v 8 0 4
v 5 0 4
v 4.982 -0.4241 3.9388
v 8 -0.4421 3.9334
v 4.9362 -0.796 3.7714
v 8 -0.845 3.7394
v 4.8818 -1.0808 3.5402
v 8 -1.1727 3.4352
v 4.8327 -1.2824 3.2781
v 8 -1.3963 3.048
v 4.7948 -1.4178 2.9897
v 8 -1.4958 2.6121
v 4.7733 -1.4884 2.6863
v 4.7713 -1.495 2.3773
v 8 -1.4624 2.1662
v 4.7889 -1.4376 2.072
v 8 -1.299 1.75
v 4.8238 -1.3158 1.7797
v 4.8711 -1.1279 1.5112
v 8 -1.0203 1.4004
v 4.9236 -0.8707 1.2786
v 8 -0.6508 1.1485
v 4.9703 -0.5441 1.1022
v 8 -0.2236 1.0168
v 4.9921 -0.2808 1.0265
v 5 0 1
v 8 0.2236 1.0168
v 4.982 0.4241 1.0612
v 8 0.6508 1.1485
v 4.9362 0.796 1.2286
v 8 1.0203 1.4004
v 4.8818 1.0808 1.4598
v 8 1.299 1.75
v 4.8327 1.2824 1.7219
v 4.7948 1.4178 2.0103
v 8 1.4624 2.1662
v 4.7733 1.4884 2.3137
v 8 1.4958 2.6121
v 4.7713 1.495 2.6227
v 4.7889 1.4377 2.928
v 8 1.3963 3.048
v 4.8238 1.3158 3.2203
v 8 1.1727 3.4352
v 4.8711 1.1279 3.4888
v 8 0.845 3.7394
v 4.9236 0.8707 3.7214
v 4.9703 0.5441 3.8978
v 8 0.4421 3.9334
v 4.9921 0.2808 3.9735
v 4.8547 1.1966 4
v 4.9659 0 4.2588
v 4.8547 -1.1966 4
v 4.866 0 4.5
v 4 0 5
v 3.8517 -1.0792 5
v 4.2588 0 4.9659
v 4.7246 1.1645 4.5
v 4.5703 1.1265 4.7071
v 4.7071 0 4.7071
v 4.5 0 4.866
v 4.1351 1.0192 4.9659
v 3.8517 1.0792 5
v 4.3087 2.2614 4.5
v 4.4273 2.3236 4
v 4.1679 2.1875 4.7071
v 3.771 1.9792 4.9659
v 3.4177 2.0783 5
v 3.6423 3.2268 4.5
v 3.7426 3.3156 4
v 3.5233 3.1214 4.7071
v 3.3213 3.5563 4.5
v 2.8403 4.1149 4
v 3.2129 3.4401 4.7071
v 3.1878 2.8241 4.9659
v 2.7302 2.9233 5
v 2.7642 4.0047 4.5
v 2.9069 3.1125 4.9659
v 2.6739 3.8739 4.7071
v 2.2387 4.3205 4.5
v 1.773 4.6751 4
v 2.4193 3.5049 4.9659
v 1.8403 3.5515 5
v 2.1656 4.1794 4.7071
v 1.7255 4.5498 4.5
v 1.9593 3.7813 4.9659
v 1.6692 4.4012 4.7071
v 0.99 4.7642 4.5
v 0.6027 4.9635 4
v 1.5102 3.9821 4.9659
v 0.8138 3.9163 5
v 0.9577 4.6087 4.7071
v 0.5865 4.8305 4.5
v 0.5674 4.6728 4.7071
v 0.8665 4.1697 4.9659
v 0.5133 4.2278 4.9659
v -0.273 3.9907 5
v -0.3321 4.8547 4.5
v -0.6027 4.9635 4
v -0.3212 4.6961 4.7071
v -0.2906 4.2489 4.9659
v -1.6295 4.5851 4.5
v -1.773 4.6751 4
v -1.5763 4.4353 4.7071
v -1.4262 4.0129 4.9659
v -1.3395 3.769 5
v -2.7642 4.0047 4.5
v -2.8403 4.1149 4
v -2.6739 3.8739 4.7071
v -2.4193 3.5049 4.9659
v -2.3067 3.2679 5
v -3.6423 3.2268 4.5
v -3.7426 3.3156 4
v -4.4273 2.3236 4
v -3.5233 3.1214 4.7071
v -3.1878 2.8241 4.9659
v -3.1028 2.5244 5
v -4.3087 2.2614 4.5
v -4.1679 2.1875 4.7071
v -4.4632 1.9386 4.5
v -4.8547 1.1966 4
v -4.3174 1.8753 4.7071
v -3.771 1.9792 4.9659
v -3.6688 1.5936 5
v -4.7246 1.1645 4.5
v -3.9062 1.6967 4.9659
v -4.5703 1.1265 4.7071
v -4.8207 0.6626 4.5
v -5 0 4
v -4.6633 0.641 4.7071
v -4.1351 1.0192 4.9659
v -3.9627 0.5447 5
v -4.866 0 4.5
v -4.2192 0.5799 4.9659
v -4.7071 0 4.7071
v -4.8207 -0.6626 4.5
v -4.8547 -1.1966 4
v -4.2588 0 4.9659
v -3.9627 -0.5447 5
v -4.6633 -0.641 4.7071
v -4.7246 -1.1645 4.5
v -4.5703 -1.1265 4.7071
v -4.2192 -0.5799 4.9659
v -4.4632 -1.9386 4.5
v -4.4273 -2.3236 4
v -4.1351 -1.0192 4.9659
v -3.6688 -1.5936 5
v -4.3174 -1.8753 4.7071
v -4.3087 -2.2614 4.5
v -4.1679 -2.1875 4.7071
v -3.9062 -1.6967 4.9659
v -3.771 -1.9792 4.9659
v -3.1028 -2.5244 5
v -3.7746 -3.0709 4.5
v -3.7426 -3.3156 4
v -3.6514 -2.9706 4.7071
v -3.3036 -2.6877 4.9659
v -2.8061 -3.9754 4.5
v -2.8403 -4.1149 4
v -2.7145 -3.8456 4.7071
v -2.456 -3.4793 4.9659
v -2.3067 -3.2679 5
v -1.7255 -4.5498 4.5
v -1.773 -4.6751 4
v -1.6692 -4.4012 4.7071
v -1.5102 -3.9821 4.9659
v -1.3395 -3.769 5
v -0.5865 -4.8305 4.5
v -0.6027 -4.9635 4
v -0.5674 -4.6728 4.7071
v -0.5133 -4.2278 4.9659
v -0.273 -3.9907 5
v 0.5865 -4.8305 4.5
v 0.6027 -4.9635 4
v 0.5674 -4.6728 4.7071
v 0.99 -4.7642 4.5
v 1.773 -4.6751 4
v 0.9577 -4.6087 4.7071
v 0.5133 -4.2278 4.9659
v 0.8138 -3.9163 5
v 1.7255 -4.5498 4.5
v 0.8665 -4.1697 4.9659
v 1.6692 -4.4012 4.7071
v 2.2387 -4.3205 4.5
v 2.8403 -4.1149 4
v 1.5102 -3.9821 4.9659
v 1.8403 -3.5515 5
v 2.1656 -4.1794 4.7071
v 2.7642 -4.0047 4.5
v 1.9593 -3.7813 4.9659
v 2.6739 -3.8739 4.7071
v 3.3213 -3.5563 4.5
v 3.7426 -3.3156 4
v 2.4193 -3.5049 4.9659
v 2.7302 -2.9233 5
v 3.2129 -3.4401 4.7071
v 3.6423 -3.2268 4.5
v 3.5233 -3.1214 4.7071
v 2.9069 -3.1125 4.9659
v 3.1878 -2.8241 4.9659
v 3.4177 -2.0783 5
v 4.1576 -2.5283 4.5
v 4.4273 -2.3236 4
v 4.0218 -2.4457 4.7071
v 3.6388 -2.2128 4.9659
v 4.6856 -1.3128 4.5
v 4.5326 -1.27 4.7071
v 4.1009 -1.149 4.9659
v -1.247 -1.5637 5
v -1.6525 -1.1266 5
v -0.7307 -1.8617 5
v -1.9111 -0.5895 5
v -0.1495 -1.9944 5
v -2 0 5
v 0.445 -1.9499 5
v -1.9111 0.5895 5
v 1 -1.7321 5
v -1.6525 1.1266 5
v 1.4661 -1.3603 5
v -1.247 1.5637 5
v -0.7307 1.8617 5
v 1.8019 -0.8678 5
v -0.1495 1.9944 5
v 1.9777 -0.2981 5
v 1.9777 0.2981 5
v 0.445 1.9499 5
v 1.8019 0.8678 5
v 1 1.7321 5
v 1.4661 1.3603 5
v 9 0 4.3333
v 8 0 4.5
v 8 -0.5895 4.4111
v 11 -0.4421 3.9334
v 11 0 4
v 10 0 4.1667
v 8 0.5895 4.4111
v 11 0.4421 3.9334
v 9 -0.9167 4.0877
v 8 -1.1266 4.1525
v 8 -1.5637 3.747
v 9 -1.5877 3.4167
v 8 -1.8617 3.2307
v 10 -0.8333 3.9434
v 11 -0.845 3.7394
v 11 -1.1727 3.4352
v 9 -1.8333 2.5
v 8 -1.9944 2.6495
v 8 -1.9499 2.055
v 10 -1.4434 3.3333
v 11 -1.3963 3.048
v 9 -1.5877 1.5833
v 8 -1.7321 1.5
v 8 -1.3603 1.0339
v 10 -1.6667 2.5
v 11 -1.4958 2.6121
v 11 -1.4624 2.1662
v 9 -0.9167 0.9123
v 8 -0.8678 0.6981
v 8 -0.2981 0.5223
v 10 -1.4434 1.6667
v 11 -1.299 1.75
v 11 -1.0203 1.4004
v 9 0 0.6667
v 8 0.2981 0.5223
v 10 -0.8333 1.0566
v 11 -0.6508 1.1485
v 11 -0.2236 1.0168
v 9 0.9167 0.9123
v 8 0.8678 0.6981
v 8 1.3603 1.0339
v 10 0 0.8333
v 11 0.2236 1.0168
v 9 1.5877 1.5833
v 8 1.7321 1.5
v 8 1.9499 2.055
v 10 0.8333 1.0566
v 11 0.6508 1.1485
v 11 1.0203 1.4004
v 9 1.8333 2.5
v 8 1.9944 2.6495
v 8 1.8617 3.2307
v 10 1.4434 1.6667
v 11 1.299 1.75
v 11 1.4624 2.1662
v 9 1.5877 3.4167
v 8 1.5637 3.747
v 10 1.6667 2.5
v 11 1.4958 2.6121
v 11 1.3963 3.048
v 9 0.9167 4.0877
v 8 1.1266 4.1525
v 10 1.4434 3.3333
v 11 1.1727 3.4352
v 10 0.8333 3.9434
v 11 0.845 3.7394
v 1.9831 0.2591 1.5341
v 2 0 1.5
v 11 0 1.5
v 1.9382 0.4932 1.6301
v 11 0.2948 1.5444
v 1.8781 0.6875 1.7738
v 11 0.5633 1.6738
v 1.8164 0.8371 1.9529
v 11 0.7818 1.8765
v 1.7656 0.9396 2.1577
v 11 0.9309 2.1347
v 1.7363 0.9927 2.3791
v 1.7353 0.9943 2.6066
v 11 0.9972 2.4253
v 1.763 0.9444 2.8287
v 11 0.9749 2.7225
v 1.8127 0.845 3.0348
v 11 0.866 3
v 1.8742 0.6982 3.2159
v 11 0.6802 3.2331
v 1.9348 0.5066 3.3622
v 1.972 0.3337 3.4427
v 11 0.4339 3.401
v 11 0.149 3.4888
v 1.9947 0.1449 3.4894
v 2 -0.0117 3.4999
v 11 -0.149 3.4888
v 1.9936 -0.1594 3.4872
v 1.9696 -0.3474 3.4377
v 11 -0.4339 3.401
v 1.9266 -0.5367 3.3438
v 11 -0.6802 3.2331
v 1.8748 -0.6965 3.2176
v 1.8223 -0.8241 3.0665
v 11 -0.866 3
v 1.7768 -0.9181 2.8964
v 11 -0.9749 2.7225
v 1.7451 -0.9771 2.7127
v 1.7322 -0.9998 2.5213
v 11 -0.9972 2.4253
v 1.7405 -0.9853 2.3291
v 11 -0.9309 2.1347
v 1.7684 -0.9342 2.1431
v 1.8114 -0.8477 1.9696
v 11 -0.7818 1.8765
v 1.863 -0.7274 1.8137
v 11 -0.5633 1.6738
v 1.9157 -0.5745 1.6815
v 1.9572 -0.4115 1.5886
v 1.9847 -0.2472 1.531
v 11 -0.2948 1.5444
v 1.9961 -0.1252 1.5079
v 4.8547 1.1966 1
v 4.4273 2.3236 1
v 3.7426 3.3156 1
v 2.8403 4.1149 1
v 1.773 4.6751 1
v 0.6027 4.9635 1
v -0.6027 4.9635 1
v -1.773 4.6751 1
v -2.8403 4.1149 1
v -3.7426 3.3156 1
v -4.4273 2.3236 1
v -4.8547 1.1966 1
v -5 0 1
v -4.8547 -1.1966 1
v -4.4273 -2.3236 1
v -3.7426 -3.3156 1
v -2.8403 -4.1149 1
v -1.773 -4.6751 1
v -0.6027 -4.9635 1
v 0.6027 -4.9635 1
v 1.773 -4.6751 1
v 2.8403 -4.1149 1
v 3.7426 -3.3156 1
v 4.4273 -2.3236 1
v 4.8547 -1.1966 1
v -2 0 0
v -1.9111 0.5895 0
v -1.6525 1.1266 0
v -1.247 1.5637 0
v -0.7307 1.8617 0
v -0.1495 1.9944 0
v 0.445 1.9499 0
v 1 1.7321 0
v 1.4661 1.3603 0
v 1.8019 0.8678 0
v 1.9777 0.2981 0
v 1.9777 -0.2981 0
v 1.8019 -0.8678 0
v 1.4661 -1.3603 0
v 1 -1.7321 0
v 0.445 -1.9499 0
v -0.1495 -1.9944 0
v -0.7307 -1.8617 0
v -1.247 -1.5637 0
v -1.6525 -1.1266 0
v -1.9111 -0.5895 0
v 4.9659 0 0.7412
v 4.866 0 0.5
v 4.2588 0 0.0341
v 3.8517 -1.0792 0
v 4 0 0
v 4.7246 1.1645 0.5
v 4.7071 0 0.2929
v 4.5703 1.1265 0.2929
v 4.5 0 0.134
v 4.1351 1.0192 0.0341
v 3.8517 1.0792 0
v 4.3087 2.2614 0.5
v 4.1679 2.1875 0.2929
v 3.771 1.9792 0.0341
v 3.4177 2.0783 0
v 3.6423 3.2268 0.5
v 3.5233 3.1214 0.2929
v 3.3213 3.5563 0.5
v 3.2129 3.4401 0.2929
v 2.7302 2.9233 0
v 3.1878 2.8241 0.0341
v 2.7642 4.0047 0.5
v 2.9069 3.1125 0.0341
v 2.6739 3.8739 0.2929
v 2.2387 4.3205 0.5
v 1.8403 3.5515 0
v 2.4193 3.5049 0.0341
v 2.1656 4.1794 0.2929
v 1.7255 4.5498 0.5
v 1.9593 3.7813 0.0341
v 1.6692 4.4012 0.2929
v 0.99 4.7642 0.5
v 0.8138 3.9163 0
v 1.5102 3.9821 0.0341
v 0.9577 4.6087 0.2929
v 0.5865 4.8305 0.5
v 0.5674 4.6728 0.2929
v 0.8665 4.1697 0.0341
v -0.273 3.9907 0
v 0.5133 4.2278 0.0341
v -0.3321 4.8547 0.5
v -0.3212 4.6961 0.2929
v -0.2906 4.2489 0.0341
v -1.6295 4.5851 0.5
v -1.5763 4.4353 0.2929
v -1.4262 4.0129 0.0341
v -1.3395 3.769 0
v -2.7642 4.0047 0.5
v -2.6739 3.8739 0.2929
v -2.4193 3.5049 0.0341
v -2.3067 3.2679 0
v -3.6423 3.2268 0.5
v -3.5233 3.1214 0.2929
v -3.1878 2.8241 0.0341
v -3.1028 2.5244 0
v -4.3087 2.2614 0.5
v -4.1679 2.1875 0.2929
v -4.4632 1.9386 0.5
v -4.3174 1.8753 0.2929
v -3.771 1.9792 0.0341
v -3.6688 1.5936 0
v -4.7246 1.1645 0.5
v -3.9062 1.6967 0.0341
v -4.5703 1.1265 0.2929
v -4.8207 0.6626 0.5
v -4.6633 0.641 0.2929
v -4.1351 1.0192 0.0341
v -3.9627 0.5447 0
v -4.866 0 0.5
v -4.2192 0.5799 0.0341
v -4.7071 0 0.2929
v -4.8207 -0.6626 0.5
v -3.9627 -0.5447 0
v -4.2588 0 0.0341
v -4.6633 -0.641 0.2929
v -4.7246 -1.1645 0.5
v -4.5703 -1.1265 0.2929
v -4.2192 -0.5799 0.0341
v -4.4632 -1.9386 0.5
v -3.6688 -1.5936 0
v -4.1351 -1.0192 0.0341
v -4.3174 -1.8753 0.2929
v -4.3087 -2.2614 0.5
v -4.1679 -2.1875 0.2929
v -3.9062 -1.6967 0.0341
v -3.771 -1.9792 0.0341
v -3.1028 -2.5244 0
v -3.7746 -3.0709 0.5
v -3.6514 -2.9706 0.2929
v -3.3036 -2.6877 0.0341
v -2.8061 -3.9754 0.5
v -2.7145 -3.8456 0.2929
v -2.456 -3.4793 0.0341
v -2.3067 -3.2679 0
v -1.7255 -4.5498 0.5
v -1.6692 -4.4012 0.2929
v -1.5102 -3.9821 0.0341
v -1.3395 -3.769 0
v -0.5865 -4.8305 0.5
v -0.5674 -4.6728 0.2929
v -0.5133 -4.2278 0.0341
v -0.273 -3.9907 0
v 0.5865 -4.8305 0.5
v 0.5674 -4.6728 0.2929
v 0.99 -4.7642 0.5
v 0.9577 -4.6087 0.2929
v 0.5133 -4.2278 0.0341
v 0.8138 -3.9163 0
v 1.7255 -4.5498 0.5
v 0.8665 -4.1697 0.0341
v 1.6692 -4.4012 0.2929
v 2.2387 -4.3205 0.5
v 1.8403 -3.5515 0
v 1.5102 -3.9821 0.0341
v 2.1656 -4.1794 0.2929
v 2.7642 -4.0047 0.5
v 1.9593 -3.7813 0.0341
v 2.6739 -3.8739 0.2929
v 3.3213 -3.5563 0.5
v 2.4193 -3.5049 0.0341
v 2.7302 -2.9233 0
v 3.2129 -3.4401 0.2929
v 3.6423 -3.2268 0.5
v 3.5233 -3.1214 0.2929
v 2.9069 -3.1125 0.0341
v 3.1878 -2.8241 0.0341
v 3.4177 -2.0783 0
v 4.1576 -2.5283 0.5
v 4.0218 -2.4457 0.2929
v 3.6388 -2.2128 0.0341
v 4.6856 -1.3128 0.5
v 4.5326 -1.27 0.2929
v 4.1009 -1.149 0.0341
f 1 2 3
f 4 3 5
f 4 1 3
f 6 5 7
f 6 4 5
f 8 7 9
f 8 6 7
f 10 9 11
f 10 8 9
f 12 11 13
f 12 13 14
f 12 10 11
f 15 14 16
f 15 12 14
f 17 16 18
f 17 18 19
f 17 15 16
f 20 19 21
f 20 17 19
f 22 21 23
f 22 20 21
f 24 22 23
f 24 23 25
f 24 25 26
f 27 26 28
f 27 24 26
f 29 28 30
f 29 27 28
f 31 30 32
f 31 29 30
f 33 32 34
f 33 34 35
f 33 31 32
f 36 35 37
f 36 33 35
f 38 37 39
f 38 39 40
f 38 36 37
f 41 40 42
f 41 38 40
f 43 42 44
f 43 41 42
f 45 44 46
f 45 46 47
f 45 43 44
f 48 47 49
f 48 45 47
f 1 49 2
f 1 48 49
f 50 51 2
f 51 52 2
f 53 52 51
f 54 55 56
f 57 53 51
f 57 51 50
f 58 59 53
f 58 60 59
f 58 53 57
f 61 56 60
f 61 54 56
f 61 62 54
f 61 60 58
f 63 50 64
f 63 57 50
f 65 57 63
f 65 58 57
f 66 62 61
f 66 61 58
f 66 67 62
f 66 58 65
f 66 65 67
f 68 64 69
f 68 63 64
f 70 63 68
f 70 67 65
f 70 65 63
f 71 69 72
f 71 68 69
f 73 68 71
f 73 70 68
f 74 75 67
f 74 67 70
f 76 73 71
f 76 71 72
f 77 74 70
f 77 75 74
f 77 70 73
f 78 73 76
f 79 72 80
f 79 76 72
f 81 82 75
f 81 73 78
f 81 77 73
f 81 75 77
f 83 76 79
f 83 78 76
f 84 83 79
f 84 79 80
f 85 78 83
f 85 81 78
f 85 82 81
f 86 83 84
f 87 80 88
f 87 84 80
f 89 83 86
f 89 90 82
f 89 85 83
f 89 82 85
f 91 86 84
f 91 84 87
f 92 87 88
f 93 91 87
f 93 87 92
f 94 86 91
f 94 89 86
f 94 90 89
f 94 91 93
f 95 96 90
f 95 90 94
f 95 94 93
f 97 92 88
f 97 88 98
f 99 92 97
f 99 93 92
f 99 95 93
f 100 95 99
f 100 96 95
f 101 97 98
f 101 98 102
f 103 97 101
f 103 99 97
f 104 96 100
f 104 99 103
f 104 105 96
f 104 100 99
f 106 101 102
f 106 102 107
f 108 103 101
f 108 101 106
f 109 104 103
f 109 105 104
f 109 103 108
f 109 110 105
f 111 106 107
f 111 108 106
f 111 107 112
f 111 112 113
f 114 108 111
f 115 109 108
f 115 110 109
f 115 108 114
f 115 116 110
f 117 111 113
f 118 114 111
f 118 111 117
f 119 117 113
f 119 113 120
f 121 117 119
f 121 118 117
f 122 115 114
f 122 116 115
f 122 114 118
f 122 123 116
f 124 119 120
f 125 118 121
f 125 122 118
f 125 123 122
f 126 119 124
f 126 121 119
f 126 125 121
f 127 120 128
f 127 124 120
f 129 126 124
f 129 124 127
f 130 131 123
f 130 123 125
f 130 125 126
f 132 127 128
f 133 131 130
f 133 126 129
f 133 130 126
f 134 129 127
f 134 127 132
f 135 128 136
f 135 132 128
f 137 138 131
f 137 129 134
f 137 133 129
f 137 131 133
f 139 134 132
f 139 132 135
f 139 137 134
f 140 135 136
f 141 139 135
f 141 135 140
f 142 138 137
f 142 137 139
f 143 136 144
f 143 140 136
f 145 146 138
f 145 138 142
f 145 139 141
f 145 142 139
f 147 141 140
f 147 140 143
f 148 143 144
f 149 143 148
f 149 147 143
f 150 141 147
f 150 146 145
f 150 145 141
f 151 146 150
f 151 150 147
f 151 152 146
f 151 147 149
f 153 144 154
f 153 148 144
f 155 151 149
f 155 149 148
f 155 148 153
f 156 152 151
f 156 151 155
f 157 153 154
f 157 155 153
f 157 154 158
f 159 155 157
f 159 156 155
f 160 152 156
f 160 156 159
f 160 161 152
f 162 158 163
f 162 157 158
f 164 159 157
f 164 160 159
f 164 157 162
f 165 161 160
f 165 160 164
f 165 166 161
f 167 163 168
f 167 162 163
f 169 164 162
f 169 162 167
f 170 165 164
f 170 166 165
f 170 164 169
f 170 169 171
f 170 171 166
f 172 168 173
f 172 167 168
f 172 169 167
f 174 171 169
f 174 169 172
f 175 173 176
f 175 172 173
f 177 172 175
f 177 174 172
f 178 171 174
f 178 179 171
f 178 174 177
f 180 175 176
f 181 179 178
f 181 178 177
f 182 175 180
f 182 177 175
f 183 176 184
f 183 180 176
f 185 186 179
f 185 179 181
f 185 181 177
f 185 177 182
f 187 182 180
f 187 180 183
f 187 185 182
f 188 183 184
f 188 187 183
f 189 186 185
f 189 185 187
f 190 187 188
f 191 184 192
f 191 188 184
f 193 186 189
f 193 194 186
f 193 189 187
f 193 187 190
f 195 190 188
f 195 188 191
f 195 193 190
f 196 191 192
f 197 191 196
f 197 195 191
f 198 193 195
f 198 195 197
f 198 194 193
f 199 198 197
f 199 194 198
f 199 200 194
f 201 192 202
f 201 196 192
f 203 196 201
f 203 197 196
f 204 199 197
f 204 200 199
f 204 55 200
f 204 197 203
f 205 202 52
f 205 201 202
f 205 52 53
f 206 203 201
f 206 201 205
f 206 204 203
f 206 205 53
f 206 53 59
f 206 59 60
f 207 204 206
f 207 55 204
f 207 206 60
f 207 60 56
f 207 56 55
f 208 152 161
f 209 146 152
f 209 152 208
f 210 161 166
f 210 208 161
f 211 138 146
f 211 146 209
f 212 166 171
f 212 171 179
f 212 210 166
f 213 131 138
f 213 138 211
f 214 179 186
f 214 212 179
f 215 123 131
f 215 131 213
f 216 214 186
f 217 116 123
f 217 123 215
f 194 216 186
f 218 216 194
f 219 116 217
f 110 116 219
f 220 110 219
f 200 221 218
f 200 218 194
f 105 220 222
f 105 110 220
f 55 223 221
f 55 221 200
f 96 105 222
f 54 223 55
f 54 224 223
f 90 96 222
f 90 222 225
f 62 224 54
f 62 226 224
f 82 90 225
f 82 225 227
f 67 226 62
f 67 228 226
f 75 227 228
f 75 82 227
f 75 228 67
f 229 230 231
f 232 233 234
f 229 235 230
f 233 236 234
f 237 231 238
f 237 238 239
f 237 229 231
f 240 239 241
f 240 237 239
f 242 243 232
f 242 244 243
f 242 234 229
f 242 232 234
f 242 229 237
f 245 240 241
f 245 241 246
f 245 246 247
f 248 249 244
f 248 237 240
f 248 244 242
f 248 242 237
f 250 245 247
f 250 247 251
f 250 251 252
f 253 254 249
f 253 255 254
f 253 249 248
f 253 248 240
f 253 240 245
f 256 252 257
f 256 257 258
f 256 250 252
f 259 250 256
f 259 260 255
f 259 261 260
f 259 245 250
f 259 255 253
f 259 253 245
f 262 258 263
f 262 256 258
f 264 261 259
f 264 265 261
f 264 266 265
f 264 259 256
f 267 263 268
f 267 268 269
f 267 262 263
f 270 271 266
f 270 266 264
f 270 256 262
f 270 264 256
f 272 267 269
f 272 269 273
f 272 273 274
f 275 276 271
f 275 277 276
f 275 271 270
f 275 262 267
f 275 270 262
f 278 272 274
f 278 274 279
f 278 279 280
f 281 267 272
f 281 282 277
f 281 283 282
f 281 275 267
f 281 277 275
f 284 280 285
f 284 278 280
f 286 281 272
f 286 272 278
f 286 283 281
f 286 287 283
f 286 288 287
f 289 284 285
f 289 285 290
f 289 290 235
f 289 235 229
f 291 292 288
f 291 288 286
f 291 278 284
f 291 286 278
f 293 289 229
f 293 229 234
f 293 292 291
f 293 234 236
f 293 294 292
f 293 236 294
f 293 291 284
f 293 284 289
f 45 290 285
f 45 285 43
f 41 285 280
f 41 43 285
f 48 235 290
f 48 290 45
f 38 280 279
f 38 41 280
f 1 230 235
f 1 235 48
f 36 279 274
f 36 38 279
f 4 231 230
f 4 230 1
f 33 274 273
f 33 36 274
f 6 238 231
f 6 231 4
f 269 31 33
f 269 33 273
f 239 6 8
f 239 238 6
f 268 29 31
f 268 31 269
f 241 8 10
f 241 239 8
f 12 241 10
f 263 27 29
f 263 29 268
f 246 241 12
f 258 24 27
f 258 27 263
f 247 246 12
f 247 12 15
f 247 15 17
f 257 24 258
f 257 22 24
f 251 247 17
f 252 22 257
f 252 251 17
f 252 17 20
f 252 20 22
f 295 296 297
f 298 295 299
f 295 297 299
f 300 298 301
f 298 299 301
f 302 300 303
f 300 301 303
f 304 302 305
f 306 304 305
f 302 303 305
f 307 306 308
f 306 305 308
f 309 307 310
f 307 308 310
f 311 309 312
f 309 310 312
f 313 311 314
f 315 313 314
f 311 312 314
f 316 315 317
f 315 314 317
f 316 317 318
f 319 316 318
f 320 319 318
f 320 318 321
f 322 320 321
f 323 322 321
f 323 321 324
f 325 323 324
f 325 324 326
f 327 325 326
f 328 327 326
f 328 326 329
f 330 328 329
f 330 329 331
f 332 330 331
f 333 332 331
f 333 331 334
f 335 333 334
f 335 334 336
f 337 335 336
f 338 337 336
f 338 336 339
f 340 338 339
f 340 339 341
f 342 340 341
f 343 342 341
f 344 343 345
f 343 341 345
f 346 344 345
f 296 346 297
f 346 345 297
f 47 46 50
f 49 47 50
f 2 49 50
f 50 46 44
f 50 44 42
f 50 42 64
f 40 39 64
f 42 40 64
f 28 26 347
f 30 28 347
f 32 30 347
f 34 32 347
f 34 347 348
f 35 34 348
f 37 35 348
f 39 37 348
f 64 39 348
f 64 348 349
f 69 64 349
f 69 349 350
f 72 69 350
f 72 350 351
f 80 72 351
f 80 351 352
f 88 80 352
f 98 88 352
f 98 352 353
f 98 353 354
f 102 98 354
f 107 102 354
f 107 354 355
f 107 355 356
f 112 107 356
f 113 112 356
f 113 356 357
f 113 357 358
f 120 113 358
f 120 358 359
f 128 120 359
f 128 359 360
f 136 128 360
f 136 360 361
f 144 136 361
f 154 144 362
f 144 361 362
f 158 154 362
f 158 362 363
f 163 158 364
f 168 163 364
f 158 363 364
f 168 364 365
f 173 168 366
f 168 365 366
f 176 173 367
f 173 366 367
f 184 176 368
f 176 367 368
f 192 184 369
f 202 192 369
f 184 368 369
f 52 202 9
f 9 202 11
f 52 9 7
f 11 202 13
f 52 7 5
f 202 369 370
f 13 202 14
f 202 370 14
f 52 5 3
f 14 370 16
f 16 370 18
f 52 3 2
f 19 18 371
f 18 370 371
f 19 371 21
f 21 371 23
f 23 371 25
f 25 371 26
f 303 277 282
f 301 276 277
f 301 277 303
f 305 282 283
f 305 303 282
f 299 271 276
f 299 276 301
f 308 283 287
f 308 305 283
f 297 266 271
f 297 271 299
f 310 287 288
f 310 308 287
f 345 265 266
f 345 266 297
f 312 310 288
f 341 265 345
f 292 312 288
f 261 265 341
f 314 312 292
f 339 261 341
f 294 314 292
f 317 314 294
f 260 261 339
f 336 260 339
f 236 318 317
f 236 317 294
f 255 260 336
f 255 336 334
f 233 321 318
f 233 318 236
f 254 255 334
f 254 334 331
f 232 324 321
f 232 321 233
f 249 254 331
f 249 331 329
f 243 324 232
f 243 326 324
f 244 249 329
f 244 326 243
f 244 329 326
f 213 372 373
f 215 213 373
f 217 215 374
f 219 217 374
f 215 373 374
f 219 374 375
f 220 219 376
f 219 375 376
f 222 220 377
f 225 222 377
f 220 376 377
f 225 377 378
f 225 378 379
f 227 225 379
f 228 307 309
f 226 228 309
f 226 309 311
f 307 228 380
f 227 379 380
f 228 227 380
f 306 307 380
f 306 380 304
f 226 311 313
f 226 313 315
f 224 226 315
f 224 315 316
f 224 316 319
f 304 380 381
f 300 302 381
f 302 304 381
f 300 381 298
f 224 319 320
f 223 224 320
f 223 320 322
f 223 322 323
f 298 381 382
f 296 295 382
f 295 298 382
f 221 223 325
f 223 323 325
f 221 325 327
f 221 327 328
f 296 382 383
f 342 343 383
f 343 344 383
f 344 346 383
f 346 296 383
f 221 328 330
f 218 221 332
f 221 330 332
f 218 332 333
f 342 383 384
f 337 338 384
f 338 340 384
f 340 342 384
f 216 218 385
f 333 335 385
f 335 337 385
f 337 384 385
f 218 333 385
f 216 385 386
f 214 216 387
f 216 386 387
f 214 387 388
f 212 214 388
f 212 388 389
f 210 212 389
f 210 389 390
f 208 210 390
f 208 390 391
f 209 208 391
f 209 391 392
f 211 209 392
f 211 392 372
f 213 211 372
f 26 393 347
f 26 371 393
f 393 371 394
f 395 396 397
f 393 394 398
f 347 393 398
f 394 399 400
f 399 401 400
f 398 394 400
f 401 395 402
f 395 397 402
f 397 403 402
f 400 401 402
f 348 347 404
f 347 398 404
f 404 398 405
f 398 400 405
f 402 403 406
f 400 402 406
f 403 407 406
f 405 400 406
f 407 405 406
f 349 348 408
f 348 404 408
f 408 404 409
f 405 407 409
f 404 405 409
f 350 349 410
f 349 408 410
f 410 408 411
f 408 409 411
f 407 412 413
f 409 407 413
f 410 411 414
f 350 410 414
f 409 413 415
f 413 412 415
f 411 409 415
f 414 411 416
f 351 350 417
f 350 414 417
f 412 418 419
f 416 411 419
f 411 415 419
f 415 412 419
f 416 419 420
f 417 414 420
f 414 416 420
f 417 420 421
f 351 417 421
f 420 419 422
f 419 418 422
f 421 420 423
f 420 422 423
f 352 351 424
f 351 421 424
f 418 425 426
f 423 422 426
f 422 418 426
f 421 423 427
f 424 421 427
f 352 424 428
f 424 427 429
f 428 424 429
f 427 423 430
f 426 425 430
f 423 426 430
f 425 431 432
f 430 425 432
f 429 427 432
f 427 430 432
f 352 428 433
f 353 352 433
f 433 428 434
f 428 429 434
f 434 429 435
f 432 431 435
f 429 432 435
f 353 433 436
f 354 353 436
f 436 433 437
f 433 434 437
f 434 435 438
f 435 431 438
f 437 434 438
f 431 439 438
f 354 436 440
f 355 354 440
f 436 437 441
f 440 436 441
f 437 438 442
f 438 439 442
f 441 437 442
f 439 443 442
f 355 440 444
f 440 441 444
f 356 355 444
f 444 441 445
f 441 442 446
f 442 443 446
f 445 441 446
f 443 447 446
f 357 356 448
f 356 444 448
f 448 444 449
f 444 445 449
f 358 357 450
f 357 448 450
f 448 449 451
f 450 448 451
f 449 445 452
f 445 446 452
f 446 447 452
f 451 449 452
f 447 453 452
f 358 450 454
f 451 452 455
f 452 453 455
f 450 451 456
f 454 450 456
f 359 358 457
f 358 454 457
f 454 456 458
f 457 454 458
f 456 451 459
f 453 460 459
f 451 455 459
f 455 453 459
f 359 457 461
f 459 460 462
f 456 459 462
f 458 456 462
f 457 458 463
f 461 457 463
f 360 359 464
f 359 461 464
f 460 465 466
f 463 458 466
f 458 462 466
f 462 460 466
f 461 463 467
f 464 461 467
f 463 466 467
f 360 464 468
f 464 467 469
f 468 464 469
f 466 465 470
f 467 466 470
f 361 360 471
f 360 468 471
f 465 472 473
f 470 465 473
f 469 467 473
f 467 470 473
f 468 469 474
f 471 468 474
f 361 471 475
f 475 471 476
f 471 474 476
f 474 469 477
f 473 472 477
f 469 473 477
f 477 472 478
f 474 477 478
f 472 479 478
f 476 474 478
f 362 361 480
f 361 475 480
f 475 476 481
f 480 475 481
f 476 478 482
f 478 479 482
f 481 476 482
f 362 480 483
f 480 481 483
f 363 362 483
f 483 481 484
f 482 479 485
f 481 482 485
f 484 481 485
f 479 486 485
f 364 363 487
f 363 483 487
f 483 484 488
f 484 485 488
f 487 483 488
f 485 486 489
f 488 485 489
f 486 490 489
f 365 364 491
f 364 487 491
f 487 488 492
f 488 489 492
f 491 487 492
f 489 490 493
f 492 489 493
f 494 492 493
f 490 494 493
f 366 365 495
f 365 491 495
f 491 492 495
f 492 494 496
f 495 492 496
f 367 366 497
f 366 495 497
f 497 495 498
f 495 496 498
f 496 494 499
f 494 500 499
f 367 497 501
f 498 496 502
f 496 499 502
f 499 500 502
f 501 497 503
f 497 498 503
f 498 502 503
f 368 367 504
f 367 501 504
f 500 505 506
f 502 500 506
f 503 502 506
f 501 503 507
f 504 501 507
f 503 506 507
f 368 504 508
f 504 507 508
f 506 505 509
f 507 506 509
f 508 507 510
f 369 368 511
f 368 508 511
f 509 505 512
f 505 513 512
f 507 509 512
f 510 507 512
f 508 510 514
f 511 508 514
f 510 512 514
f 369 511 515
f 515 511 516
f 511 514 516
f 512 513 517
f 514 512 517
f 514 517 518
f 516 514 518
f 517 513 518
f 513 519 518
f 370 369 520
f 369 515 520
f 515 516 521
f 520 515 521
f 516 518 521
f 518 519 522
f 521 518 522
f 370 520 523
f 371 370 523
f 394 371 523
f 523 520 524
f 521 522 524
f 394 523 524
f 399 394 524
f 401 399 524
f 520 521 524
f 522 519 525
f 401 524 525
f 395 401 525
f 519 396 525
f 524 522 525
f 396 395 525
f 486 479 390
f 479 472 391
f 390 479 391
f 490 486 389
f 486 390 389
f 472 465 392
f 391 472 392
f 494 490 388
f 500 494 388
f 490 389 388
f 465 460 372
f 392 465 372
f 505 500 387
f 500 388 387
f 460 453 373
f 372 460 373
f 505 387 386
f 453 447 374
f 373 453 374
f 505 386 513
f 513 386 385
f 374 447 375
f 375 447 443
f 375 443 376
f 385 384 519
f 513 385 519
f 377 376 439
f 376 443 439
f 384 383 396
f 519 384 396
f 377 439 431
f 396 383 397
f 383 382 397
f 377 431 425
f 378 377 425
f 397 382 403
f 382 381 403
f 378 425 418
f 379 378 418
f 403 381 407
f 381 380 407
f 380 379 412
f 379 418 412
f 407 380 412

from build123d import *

# Parameters (mm, degrees)
SKETCH1_R           = 5
BOSS_EXTRUDE1_DEPTH = 5
FILLET1_R           = 1
SKETCH2_R           = 2
CUT_EXTRUDE1_DEPTH  = 5
SKETCH4_R           = 1
CUT_EXTRUDE2_DEPTH  = 10


with BuildPart() as part:
    # Sketch1 → Boss-Extrude1 (new body)
    with BuildSketch(Plane.XY):
        Circle(SKETCH1_R)
    extrude(amount=BOSS_EXTRUDE1_DEPTH)

    # Fillet1
    fillet1_edges = [part.edges().sort_by_distance(p)[0] for p in [
        (-5, 0, 0),
        (-5, 0, 5),
    ]]
    fillet(fillet1_edges, radius=FILLET1_R)

    # Sketch2 → Cut-Extrude1 (cut)
    with BuildSketch(Plane(origin=(0, 0, 0), x_dir=(-1, 0, 0), z_dir=(0, 0, -1))):
        Circle(SKETCH2_R)
    extrude(amount=-CUT_EXTRUDE1_DEPTH, mode=Mode.SUBTRACT)

    # Sketch3 → Revolve1 (revolve)
    with BuildSketch(Plane(origin=(0, 0, 0), x_dir=(1, 0, 0), z_dir=(0, 1, 0)), mode=Mode.PRIVATE) as revolve1_sk:
        Polygon((4.094510591, -1), (8, -1), (8, -0.5), (11, -1), (11, -2.5), (4.094510591, -2.5), align=None)
    revolve(revolve1_sk.sketch.rotate(Axis((5, 0, 2.5), (1, 0, 0)), 180), axis=Axis((5, 0, 2.5), (1, 0, 0)))

    # Sketch4 → Cut-Extrude2 (cut)
    with BuildSketch(Plane(origin=(11, 0, 0), x_dir=(0, 0, -1), z_dir=(1, 0, 0))):
        with Locations((-2.5, 0)):
            Circle(SKETCH4_R)
    extrude(amount=-CUT_EXTRUDE2_DEPTH, mode=Mode.SUBTRACT)


solid = part.part
